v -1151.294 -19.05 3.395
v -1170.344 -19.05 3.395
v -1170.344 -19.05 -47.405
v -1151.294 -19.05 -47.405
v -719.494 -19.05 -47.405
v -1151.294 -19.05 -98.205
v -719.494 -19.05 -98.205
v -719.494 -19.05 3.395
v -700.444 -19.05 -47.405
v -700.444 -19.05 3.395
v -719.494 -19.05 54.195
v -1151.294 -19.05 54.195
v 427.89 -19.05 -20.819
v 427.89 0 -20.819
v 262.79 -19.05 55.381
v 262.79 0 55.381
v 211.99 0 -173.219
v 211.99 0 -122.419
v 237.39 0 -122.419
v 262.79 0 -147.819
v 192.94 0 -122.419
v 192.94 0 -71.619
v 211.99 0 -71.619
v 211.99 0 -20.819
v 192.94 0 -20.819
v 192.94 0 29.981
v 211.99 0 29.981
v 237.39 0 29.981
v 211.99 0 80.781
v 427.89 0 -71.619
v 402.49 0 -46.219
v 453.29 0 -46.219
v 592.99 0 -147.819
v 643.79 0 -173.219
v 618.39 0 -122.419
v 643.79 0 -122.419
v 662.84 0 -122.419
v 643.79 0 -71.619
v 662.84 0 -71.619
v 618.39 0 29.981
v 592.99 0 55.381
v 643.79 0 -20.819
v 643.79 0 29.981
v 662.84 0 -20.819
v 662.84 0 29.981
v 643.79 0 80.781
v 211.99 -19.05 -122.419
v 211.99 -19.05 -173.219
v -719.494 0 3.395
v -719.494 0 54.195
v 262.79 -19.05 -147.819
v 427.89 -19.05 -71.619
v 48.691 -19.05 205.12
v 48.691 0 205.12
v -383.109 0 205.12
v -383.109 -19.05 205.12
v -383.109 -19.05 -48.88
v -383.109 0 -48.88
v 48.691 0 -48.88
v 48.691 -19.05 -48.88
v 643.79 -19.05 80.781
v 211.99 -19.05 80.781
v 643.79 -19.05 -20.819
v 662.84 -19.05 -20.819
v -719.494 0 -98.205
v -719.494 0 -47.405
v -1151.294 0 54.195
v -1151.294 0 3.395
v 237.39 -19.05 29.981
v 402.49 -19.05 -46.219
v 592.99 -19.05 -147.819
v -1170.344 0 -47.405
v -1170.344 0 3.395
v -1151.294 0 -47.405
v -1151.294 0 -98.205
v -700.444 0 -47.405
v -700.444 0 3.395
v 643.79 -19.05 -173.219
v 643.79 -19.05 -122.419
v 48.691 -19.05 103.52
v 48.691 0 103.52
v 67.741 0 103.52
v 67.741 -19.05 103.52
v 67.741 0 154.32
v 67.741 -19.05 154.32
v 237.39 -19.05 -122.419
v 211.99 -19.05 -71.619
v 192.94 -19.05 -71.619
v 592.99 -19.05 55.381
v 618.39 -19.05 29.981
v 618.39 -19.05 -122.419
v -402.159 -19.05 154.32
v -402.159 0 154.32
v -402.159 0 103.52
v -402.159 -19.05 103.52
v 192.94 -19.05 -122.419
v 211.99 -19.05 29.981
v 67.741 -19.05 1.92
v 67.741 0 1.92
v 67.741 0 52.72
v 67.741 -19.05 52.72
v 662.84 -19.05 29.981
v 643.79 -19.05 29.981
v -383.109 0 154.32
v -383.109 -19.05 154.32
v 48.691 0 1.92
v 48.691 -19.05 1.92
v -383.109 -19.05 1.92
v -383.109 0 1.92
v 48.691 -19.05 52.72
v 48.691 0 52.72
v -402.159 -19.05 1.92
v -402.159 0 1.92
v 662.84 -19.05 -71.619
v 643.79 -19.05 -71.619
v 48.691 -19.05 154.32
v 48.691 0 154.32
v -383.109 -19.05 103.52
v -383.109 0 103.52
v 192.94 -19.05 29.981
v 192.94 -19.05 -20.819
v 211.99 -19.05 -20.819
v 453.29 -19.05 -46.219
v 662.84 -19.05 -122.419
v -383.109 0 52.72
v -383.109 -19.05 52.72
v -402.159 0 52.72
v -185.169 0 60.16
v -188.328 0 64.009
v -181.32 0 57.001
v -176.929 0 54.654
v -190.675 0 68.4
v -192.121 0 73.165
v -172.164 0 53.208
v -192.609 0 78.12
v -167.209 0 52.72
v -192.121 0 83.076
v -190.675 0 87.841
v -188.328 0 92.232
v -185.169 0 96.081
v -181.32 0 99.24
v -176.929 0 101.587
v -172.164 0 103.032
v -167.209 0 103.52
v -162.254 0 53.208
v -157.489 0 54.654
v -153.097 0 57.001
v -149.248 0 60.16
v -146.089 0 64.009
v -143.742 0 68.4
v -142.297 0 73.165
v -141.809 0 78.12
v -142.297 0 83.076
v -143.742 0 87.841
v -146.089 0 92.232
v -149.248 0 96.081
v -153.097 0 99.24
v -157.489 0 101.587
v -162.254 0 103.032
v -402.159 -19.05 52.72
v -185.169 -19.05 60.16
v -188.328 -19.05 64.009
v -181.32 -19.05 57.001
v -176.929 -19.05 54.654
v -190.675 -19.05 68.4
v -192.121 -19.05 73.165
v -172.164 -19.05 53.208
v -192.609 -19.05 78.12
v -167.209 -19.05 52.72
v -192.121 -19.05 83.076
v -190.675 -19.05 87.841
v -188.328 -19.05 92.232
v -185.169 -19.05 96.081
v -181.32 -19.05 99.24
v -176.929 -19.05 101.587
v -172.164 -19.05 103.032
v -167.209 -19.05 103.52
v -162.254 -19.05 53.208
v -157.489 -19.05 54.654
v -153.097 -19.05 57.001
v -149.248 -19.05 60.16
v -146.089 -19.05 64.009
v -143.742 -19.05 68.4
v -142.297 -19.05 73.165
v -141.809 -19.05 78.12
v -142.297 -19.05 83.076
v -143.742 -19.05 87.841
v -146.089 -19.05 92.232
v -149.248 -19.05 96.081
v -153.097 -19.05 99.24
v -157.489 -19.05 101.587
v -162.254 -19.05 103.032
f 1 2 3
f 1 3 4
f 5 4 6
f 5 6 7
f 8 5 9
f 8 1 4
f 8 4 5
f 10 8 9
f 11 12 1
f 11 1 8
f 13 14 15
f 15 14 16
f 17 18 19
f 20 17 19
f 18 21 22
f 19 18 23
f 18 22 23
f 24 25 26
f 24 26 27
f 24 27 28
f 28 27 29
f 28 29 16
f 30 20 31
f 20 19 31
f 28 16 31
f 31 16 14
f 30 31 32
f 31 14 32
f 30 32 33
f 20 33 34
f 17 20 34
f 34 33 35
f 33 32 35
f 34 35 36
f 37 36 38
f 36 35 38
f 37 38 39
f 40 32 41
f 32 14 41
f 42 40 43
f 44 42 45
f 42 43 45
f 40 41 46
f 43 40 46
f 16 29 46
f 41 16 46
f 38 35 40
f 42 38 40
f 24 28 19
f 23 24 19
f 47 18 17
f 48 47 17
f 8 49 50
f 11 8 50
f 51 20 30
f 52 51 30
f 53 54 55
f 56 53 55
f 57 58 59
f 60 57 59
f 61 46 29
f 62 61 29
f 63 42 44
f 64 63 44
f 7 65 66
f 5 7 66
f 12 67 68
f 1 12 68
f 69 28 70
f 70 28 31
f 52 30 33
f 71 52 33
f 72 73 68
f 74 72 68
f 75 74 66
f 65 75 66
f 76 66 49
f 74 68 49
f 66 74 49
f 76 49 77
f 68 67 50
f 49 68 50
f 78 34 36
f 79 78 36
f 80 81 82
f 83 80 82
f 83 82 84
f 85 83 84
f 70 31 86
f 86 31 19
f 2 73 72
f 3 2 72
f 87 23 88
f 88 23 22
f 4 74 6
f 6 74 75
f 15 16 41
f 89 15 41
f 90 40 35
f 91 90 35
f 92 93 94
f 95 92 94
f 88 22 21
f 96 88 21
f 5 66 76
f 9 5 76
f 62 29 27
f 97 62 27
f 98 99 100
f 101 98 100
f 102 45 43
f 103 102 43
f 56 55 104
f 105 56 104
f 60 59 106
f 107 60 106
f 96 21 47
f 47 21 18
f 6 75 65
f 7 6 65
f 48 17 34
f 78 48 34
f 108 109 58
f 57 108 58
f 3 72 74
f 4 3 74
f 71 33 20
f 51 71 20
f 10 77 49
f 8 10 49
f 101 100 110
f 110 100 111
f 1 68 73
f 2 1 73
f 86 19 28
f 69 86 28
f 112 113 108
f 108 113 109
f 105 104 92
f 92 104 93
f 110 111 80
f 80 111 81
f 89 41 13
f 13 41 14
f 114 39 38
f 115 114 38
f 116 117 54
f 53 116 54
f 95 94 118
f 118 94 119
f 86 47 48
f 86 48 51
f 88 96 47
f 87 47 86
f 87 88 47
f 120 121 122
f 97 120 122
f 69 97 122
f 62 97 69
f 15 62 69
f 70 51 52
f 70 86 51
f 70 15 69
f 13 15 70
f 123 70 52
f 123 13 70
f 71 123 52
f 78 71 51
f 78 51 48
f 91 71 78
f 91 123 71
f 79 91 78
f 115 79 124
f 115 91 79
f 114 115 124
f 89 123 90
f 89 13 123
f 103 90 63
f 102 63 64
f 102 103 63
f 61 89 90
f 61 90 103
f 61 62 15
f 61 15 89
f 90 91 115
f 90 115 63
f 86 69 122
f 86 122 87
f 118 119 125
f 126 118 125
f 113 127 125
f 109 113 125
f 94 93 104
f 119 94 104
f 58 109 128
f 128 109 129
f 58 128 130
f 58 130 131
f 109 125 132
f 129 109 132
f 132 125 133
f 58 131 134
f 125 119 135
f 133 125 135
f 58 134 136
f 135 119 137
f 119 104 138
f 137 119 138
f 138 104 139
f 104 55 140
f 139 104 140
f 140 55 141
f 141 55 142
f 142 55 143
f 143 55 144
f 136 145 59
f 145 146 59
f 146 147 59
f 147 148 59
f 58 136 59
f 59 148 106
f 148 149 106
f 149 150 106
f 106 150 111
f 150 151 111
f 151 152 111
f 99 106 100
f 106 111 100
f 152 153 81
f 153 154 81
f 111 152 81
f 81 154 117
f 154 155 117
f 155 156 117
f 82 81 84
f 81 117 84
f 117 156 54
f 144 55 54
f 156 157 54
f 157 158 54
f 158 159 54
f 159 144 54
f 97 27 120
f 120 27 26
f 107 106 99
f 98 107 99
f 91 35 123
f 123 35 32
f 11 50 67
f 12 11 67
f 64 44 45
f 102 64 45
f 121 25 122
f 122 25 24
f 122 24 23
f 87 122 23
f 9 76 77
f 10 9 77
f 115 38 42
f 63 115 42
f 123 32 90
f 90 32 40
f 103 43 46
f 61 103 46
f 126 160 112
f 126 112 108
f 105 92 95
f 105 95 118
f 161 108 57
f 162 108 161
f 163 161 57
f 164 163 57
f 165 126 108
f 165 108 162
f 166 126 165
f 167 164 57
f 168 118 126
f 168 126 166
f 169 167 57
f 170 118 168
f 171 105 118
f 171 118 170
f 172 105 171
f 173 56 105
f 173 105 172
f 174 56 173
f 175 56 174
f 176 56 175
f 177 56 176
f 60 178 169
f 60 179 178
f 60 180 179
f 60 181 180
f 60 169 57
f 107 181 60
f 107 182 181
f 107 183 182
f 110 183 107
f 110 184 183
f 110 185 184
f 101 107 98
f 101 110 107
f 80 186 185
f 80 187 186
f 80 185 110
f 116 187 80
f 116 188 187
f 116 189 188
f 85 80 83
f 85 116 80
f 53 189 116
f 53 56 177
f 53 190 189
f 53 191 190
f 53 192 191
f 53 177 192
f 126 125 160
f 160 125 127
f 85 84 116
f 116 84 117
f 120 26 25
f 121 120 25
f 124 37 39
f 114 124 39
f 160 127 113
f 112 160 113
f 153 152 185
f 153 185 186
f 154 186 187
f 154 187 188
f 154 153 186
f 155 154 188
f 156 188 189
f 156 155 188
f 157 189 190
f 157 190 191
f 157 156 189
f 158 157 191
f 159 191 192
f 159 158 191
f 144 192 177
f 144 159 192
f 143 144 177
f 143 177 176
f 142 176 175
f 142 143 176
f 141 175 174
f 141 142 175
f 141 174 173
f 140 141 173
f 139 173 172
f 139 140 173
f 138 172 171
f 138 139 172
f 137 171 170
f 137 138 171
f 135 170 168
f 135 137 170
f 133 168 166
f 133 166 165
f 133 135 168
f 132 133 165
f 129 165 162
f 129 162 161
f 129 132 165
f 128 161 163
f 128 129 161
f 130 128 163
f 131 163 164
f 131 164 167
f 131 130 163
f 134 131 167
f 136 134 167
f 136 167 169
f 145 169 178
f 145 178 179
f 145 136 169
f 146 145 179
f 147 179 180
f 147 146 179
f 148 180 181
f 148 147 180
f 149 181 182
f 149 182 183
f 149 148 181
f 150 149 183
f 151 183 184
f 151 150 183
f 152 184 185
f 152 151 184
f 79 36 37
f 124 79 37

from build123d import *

# Parameters (mm, degrees)
F0_R     = 25.4
F1_DEPTH = 19.05
F2_DEPTH = 19.05


with BuildPart() as f1:
    # F0 (on Front) → F1 (new body)
    with BuildSketch(Plane.XZ):
        Polygon((48.691178, 205.120425), (-383.108822, 205.120425), (-383.108822, 154.320425), (-402.158822, 154.320425), (-402.158822, 103.520425), (-383.108822, 103.520425), (-383.108822, 52.720425), (-402.158822, 52.720425), (-402.158822, 1.920425), (-383.108822, 1.920425), (-383.108822, -48.879575), (48.691178, -48.879575), (48.691178, 1.920425), (67.741178, 1.920425), (67.741178, 52.720425), (48.691178, 52.720425), (48.691178, 103.520425), (67.741178, 103.520425), (67.741178, 154.320425), (48.691178, 154.320425), align=None)
        with Locations((-167.208822, 78.120425)):
            Circle(F0_R, mode=Mode.SUBTRACT)
    extrude(amount=F1_DEPTH)

    # F0 (on Front) → F2 (join)
    with BuildSketch(Plane.XZ):
        Polygon((48.691178, 205.120425), (-383.108822, 205.120425), (-383.108822, 154.320425), (-402.158822, 154.320425), (-402.158822, 103.520425), (-383.108822, 103.520425), (-383.108822, 52.720425), (-402.158822, 52.720425), (-402.158822, 1.920425), (-383.108822, 1.920425), (-383.108822, -48.879575), (48.691178, -48.879575), (48.691178, 1.920425), (67.741178, 1.920425), (67.741178, 52.720425), (48.691178, 52.720425), (48.691178, 103.520425), (67.741178, 103.520425), (67.741178, 154.320425), (48.691178, 154.320425), align=None)
        with Locations((-167.208822, 78.120425)):
            Circle(F0_R, mode=Mode.SUBTRACT)
        Polygon((-1151.293701, -47.404783), (-1151.293701, -98.204783), (-719.493701, -98.204783), (-719.493701, -47.404783), (-700.443701, -47.404783), (-700.443701, 3.395217), (-719.493701, 3.395217), (-719.493701, 54.195217), (-1151.293701, 54.195217), (-1151.293701, 3.395217), (-1170.343701, 3.395217), (-1170.343701, -47.404783), align=None)
        Polygon((643.789858, 80.780788), (211.989858, 80.780788), (211.989858, 29.980788), (192.939858, 29.980788), (192.939858, -20.819212), (211.989858, -20.819212), (211.989858, -71.619212), (192.939858, -71.619212), (192.939858, -122.419212), (211.989858, -122.419212), (211.989858, -173.219212), (643.789858, -173.219212), (643.789858, -122.419212), (662.839858, -122.419212), (662.839858, -71.619212), (643.789858, -71.619212), (643.789858, -20.819212), (662.839858, -20.819212), (662.839858, 29.980788), (643.789858, 29.980788), align=None)
        Polygon((262.789858, -147.819212), (427.889858, -71.619212), (592.989858, -147.819212), align=None, mode=Mode.SUBTRACT)
        Polygon((237.389858, 29.980788), (402.489858, -46.219212), (237.389858, -122.419212), align=None, mode=Mode.SUBTRACT)
        Polygon((618.389858, -122.419212), (453.289858, -46.219212), (618.389858, 29.980788), align=None, mode=Mode.SUBTRACT)
        Polygon((592.989858, 55.380788), (427.889858, -20.819212), (262.789858, 55.380788), align=None, mode=Mode.SUBTRACT)
    extrude(amount=F2_DEPTH)


solid = f1.part
